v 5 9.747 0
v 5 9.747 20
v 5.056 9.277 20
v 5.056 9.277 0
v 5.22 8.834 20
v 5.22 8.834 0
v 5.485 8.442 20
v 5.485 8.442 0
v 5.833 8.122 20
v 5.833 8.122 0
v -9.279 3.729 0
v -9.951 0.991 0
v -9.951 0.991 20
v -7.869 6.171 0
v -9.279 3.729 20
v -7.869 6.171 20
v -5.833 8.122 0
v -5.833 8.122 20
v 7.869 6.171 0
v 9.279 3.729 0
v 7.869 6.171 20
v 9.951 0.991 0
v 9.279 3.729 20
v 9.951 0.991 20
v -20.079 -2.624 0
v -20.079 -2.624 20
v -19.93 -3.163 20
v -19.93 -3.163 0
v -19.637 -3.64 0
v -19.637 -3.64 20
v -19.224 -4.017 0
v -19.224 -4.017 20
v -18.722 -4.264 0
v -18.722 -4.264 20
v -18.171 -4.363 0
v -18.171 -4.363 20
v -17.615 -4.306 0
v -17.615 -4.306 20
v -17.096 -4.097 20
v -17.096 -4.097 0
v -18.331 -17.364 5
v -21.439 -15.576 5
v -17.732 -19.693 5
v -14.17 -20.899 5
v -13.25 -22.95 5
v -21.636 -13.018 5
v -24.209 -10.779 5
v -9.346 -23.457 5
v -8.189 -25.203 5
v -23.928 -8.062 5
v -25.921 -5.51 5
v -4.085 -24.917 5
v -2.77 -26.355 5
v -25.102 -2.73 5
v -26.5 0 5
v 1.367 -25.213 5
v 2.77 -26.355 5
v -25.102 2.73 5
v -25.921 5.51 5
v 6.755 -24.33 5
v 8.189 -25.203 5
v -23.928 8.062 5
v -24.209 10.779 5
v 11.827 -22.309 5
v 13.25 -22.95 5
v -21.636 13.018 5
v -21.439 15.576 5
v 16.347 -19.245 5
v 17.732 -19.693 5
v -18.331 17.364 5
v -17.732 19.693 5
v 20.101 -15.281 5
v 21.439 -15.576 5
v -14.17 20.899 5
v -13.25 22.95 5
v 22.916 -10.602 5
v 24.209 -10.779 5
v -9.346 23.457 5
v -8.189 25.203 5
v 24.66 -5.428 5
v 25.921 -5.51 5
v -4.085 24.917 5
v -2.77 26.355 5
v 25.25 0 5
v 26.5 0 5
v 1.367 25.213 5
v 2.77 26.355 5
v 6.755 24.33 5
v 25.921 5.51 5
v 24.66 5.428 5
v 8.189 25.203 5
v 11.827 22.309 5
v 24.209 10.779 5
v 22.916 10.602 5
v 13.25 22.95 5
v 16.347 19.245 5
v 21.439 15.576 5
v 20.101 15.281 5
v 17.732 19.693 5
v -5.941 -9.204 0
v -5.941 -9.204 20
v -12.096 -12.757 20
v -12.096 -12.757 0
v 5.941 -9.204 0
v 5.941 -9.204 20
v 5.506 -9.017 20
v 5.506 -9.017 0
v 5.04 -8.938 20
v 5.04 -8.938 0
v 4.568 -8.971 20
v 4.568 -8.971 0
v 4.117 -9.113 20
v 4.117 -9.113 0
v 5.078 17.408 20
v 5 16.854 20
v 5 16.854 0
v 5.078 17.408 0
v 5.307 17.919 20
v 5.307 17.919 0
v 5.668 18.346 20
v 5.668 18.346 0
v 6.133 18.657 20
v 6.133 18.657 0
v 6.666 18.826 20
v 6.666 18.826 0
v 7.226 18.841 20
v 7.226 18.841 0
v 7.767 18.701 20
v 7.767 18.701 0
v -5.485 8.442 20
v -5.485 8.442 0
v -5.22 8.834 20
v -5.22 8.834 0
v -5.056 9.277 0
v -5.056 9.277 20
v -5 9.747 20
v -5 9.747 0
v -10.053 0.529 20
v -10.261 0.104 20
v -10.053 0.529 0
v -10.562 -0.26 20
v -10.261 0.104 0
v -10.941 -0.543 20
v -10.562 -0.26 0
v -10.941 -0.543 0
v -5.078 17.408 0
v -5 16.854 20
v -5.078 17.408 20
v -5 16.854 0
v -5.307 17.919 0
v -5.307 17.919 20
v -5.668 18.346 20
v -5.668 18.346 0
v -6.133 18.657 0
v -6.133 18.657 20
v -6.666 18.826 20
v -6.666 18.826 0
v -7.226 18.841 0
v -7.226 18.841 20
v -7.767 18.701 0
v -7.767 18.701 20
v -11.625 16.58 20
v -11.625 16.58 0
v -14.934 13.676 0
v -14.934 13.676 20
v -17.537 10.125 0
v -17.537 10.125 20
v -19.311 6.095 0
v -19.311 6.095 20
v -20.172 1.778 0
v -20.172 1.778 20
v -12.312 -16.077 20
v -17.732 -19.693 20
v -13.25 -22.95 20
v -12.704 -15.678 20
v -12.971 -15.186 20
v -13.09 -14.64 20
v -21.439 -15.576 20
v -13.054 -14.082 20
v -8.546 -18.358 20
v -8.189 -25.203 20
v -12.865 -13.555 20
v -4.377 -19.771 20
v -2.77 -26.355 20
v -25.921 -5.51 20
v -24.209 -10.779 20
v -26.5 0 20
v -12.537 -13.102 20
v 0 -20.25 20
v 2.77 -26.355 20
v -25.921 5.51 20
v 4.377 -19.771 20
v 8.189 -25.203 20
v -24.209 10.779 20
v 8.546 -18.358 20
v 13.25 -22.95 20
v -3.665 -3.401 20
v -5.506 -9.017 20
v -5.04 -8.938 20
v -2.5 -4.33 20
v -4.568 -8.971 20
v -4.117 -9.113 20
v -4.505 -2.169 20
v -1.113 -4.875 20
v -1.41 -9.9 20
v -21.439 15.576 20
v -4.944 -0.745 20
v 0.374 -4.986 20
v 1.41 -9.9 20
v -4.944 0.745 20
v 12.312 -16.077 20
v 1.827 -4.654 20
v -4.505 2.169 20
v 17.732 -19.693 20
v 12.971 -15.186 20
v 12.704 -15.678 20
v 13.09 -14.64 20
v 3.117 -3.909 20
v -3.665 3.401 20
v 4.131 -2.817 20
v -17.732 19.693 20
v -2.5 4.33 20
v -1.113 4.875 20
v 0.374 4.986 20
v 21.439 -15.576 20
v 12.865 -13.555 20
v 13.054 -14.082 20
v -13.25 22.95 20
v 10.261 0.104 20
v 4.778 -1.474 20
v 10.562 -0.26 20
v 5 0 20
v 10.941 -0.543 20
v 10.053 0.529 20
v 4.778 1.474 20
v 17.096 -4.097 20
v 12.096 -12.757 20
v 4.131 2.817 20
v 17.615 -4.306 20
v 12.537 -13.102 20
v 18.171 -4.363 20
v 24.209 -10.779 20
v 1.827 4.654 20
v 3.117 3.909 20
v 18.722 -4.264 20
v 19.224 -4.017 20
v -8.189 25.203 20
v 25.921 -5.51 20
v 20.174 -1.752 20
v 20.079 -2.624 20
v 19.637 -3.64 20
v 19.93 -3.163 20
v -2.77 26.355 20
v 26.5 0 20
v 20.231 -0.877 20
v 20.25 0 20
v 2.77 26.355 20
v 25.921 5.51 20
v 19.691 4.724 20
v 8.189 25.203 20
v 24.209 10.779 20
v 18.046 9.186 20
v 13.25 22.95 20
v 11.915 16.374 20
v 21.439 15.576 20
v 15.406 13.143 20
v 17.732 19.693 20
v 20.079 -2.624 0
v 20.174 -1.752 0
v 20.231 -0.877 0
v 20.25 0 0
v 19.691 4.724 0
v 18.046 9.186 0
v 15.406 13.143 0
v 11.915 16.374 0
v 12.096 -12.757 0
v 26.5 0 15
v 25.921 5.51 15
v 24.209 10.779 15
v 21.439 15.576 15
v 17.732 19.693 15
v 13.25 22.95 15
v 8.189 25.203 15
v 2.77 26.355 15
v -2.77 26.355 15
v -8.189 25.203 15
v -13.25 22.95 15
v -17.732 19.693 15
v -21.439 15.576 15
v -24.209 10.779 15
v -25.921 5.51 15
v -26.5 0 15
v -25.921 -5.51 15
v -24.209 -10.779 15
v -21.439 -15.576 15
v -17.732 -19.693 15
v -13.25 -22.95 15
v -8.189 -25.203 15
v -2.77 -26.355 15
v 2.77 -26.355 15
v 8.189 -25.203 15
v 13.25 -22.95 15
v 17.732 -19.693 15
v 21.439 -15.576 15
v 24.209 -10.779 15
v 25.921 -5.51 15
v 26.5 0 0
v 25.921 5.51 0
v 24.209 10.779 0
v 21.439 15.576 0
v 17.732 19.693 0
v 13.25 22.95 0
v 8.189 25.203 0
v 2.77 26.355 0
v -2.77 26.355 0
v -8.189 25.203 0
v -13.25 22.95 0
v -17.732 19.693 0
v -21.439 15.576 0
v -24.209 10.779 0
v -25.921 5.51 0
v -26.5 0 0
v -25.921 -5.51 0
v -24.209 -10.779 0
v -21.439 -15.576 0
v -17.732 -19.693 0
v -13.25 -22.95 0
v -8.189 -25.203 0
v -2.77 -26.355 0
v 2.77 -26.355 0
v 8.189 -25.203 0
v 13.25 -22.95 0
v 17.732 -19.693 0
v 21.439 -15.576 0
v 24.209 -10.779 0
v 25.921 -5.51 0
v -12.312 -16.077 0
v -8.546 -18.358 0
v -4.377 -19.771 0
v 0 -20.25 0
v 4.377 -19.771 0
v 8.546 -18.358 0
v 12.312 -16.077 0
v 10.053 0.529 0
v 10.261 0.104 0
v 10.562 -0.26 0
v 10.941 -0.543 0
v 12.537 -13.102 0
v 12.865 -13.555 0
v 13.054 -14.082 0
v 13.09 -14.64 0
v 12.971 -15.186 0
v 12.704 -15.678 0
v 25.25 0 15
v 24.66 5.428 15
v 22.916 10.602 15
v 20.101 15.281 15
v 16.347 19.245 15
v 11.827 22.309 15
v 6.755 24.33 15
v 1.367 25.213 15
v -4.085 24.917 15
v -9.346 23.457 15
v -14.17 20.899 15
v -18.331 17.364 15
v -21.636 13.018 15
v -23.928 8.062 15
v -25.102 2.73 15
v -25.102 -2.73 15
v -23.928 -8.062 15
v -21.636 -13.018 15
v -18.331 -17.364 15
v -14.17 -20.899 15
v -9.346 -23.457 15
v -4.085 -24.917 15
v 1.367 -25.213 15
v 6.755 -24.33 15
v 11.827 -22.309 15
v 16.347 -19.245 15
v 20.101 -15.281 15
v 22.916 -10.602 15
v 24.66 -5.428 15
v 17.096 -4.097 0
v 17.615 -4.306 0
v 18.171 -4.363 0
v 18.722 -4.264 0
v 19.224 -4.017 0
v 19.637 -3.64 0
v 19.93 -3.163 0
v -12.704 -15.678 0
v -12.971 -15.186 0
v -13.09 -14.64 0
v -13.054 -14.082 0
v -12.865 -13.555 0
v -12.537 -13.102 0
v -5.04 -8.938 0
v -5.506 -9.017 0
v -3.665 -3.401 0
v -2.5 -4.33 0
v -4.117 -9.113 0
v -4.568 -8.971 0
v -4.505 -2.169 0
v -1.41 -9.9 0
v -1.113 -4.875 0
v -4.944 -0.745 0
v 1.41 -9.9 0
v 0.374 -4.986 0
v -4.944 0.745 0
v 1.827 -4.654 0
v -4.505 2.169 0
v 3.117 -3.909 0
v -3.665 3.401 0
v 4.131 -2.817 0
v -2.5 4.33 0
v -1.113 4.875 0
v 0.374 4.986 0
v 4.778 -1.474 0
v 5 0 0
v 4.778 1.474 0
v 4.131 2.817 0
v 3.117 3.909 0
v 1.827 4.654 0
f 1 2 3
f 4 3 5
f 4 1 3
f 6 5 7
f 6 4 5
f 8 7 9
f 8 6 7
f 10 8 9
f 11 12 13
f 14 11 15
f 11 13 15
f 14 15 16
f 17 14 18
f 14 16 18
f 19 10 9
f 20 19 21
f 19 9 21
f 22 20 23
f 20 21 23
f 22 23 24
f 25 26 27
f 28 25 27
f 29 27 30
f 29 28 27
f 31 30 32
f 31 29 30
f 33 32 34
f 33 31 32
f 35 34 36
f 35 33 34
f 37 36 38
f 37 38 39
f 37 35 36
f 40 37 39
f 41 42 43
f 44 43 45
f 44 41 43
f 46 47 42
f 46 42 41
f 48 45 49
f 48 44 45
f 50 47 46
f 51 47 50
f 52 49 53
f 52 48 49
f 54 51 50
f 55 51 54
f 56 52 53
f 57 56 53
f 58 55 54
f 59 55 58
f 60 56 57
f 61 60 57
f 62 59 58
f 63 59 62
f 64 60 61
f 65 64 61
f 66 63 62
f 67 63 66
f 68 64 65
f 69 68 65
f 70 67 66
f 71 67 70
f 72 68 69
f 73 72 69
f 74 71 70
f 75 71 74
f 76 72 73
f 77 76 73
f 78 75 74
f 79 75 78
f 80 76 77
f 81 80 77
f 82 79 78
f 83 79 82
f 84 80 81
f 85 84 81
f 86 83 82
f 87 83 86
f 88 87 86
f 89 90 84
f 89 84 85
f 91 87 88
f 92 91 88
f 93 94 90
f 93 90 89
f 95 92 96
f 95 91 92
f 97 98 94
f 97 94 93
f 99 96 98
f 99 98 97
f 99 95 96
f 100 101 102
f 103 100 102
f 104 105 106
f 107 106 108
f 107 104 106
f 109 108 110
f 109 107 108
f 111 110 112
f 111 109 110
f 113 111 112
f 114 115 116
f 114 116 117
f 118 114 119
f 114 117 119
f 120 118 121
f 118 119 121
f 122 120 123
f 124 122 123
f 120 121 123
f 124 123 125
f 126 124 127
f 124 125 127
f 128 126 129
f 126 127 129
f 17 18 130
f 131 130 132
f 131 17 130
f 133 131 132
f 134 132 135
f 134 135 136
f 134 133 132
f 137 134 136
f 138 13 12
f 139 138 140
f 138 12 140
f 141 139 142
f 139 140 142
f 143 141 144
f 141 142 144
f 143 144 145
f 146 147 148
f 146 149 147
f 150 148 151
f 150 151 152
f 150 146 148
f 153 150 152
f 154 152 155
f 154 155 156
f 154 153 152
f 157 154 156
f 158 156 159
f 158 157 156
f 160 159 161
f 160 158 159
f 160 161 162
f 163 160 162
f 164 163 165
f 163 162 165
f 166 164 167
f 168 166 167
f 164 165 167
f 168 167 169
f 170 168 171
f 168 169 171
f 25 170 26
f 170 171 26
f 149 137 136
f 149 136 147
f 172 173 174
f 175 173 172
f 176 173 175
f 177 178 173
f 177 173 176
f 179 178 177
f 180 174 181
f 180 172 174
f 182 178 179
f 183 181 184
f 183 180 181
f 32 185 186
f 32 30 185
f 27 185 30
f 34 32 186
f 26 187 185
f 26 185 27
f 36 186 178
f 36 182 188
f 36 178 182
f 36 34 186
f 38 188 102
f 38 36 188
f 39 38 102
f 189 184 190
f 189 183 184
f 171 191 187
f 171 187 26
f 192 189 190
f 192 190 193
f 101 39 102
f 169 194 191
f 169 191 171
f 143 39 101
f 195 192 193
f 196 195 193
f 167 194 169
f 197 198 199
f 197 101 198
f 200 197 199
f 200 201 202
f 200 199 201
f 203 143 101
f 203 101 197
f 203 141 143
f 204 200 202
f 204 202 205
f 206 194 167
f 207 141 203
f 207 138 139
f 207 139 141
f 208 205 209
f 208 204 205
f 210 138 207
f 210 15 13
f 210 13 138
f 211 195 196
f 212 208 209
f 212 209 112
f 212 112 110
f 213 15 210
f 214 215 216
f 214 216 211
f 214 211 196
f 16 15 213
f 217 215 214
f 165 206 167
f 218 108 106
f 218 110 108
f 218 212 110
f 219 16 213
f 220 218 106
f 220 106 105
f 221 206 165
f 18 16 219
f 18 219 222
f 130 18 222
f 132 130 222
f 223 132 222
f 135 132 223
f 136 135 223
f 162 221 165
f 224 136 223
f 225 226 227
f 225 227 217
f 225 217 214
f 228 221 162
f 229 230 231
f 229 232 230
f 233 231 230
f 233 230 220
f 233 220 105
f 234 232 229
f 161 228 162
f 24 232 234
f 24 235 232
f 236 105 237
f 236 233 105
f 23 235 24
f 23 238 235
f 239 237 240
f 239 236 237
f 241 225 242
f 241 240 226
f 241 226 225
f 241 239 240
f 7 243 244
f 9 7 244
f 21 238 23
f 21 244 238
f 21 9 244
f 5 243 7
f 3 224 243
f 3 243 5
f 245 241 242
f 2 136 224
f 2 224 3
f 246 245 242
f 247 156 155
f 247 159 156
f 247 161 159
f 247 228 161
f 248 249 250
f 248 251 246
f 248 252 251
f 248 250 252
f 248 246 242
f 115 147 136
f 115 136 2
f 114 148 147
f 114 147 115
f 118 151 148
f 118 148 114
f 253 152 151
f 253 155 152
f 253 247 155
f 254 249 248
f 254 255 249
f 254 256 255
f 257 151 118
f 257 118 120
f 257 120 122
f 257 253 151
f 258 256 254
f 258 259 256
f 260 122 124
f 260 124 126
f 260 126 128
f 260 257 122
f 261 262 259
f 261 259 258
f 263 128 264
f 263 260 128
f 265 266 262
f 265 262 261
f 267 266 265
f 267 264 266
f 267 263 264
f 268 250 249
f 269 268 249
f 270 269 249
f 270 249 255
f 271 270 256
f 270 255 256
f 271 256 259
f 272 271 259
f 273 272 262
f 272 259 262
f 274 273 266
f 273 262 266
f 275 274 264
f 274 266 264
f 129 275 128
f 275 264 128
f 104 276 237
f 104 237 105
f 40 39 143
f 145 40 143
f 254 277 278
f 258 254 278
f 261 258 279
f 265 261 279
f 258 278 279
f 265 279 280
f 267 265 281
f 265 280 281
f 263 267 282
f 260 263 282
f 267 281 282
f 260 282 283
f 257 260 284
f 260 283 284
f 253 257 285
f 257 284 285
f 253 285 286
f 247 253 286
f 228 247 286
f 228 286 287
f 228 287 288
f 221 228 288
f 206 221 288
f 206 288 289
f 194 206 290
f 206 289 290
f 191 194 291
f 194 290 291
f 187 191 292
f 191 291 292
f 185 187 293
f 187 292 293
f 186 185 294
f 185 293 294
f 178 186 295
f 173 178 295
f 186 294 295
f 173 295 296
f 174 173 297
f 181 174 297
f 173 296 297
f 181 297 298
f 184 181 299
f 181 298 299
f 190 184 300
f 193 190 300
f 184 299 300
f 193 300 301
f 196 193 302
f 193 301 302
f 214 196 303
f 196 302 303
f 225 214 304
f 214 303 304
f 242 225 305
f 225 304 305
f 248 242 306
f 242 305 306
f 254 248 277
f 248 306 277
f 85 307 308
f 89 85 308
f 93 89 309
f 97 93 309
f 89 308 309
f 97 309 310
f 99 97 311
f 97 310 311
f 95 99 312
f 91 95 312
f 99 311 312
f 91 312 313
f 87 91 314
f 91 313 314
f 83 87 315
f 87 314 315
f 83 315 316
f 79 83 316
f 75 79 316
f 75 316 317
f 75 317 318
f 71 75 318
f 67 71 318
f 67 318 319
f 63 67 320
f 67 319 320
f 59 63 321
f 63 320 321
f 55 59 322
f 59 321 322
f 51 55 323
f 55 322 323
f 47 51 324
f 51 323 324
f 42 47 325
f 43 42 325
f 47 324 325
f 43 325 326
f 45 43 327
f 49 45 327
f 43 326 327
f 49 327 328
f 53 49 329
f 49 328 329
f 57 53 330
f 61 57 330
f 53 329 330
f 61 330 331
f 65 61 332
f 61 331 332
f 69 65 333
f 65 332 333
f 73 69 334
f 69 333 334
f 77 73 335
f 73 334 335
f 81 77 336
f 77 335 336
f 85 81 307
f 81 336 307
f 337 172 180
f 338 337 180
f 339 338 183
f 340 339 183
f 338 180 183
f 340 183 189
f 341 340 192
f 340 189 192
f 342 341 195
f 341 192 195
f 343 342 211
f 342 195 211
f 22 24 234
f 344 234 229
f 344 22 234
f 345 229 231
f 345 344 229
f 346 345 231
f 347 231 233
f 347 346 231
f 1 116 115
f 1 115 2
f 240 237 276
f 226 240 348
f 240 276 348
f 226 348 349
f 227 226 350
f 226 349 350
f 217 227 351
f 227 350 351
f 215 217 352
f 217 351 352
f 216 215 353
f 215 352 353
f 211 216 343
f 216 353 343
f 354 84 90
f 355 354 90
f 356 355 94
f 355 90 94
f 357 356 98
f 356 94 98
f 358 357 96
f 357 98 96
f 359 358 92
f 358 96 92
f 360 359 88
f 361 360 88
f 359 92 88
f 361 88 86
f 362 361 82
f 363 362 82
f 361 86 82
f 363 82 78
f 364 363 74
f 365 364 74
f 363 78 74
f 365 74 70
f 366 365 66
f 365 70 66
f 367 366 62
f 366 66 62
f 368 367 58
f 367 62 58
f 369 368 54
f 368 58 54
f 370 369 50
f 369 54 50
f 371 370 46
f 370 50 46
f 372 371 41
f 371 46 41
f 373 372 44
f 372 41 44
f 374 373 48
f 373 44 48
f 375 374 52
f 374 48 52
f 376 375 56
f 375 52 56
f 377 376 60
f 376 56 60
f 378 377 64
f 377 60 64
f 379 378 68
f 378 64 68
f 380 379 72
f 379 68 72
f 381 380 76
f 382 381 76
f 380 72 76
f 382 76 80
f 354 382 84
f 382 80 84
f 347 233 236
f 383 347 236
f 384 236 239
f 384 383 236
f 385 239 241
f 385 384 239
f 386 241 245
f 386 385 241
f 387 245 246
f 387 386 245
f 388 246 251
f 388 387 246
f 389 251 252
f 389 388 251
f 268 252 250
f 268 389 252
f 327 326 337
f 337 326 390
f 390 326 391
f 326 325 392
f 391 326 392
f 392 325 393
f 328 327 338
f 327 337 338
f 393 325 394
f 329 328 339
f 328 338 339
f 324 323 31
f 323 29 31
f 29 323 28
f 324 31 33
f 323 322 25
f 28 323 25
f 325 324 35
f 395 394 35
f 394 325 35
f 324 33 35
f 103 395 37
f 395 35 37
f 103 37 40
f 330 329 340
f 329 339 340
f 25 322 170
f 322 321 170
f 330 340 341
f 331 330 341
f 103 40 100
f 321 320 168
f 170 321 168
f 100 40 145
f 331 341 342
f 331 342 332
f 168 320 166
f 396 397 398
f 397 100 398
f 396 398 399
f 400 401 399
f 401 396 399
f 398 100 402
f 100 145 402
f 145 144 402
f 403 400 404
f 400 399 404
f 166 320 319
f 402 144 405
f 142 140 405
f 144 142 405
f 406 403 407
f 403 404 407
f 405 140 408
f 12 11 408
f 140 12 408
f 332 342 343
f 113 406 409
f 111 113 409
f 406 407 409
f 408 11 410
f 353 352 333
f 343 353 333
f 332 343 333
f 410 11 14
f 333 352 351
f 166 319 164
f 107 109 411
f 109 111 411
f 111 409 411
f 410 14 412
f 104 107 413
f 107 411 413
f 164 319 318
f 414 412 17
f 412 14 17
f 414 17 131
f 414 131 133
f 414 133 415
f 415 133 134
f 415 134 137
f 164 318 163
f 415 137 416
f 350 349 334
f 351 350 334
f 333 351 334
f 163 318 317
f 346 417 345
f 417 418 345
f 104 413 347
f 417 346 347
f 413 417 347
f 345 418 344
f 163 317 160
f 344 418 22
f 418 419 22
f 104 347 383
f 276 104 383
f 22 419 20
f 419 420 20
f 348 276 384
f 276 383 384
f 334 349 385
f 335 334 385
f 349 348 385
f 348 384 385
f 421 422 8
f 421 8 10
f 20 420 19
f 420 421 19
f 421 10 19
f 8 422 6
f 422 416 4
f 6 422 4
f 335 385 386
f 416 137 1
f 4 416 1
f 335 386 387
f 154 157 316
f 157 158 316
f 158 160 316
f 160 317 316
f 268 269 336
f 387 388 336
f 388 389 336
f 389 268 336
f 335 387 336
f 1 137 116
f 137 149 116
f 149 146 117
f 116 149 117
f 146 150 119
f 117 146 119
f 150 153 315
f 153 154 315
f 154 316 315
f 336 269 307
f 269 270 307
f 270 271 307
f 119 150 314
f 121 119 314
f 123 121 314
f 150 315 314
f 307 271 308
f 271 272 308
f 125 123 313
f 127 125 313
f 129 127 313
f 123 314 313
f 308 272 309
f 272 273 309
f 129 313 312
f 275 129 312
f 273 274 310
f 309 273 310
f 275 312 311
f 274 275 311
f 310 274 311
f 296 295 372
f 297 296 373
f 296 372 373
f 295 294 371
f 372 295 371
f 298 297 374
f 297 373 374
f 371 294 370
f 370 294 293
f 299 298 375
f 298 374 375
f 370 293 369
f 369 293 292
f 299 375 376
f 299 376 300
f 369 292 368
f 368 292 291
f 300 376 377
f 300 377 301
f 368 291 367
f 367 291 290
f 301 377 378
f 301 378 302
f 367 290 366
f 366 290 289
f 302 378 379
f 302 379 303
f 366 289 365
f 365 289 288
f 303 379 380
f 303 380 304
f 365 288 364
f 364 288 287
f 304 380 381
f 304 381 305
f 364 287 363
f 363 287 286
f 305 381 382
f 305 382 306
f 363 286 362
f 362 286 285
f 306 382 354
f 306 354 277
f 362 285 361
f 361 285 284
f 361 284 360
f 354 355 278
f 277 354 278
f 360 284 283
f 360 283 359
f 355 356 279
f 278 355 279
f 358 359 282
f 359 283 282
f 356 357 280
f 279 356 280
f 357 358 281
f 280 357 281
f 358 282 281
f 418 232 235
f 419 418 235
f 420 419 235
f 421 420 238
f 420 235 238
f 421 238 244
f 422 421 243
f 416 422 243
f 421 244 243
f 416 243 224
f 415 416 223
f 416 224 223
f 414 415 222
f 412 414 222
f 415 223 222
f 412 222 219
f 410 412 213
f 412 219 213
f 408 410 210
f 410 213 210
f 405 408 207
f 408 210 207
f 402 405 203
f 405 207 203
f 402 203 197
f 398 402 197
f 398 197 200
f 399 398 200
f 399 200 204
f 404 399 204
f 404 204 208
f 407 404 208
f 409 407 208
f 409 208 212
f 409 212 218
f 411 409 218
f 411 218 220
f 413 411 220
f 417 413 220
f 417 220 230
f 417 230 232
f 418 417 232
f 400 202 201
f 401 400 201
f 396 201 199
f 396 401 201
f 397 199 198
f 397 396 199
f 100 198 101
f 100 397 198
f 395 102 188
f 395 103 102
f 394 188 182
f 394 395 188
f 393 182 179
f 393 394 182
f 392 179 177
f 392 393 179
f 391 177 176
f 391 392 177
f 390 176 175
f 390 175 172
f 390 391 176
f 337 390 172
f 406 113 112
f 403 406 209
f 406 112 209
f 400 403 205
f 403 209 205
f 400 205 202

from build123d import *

# Parameters (mm, degrees)
SKETCH1_R           = 26.5
BOSS_EXTRUDE1_DEPTH = 5
SKETCH2_R           = 25.25
BOSS_EXTRUDE2_DEPTH = 10
SKETCH3_R           = 26.5
BOSS_EXTRUDE3_DEPTH = 5
SKETCH4_R           = 5
CUT_EXTRUDE1_DEPTH  = 43.479406776
CUT_EXTRUDE2_DEPTH  = 43.479406776
FILLET1_R           = 2


with BuildPart() as part:
    # Sketch1 → Boss-Extrude1 (new body)
    with BuildSketch(Plane.XY):
        Circle(SKETCH1_R)
    extrude(amount=BOSS_EXTRUDE1_DEPTH)

    # Sketch2 → Boss-Extrude2 (add)
    with BuildSketch(Plane.XY.offset(5)):
        Circle(SKETCH2_R)
    extrude(amount=BOSS_EXTRUDE2_DEPTH)

    # Sketch3 → Boss-Extrude3 (add)
    with BuildSketch(Plane.XY.offset(15)):
        Circle(SKETCH3_R)
    extrude(amount=BOSS_EXTRUDE3_DEPTH)

    # Sketch4 → Cut-Extrude1 (cut, through all)
    with BuildSketch(Plane.XY.offset(20)):
        Circle(SKETCH4_R)
    extrude(amount=-CUT_EXTRUDE1_DEPTH, mode=Mode.SUBTRACT)

    # Sketch6 → Cut-Extrude2 (cut, through all)
    with BuildSketch(Plane.XY.offset(20)):
        with BuildLine():
            ThreePointArc((-10, 0), (-8.660254038, 5), (-5, 8.660254038))
            Line((-5, 8.660254038), (-5, 19.623009453))
            ThreePointArc((-5, 19.623009453), (-17.537014427, 10.125), (-19.494024685, -5.481377708))
            Line((-19.494024685, -5.481377708), (-10, 0))
        make_face()
        with BuildLine():
            Line((14.494024685, -14.141631746), (5, -8.660254038))
            ThreePointArc((5, -8.660254038), (0, -10), (-5, -8.660254038))
            Line((-5, -8.660254038), (-14.494024685, -14.141631746))
            ThreePointArc((-14.494024685, -14.141631746), (0, -20.25), (14.494024685, -14.141631746))
        make_face()
        with BuildLine():
            Line((5, 19.623009453), (5, 8.660254038))
            ThreePointArc((5, 8.660254038), (8.660254038, 5), (10, 0))
            Line((10, 0), (19.494024685, -5.481377708))
            ThreePointArc((19.494024685, -5.481377708), (20.0601159, -2.766631537), (20.25, 0))
            ThreePointArc((20.25, 0), (15.989254204, 12.426031144), (5, 19.623009453))
        make_face()
    extrude(amount=-CUT_EXTRUDE2_DEPTH, mode=Mode.SUBTRACT)

    # Fillet1
    fillet1_edges = [part.edges().sort_by_distance(p)[0] for p in [
        (10, 0, 10),
        (5, 8.660254038, 10),
        (5, 19.623009453, 10),
        (19.494024685, -5.481377708, 10),
        (-5, -8.660254038, 10),
        (5, -8.660254038, 10),
        (14.494024685, -14.141631746, 10),
        (-14.494024685, -14.141631746, 10),
        (-5, 8.660254038, 10),
        (-10, 0, 10),
        (-19.494024685, -5.481377708, 10),
        (-5, 19.623009453, 10),
    ]]
    fillet(fillet1_edges, radius=FILLET1_R)


solid = part.part
